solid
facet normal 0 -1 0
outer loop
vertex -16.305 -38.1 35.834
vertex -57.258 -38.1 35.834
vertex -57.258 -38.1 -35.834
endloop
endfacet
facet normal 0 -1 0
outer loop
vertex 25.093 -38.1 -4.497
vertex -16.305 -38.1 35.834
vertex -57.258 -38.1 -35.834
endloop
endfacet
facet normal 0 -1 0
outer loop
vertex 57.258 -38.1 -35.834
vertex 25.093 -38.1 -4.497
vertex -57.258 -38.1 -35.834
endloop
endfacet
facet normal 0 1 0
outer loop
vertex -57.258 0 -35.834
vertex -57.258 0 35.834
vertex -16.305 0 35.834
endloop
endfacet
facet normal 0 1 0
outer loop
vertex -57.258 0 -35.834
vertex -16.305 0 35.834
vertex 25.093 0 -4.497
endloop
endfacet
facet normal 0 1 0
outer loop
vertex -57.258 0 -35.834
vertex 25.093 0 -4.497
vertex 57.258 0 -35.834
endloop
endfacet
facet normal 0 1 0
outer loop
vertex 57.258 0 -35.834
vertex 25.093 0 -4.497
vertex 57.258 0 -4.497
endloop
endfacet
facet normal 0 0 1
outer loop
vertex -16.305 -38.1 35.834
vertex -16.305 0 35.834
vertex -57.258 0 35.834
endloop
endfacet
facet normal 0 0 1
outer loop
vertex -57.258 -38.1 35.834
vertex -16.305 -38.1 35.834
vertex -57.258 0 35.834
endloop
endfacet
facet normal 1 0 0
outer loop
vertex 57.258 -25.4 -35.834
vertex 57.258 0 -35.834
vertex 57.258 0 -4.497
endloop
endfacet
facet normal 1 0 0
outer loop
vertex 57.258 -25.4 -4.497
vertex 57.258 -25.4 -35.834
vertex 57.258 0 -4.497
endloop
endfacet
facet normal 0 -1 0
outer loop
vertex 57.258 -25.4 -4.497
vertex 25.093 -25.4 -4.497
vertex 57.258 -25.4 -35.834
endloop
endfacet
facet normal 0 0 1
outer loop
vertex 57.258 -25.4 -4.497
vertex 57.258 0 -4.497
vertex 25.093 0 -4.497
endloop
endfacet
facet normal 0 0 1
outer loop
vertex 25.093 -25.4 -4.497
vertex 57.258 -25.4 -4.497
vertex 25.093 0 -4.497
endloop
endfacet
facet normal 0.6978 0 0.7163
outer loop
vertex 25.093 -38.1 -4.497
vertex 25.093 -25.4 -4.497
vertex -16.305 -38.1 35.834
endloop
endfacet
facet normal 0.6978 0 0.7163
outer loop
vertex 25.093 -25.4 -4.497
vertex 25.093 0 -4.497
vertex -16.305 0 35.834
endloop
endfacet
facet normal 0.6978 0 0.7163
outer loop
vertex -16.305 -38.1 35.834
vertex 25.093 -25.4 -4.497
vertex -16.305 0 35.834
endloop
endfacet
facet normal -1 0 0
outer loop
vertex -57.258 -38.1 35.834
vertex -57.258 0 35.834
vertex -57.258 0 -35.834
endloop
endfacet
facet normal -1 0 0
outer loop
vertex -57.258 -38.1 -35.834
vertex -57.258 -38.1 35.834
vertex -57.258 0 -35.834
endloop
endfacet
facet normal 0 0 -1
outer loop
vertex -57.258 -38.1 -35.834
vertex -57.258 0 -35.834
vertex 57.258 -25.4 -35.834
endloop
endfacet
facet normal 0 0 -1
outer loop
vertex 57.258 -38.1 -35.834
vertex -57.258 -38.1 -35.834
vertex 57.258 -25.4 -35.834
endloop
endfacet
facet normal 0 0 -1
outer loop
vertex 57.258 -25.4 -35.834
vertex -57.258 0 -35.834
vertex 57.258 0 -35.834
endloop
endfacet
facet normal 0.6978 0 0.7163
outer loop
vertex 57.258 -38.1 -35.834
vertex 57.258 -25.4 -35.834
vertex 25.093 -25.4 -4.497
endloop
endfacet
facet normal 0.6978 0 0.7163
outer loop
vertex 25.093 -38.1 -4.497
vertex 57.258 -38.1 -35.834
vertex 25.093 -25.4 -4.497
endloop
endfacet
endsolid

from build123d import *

# Parameters (mm, degrees)
F1_DEPTH = 38.1
F2_DEPTH = 25.4


with BuildPart() as f1:
    # F0 (on Front) → F1 (new body)
    with BuildSketch(Plane.XZ):
        Polygon((25.092965, -4.49749), (-16.305355, 35.833862), (-57.258341, 35.833862), (-57.258341, -35.833862), (57.258341, -35.833862), align=None)
    extrude(amount=F1_DEPTH)

    # F0 (on Front) → F2 (join)
    with BuildSketch(Plane.XZ):
        Polygon((57.258341, -4.49749), (25.092965, -4.49749), (57.258341, -35.833862), align=None)
    extrude(amount=F2_DEPTH)


solid = f1.part
